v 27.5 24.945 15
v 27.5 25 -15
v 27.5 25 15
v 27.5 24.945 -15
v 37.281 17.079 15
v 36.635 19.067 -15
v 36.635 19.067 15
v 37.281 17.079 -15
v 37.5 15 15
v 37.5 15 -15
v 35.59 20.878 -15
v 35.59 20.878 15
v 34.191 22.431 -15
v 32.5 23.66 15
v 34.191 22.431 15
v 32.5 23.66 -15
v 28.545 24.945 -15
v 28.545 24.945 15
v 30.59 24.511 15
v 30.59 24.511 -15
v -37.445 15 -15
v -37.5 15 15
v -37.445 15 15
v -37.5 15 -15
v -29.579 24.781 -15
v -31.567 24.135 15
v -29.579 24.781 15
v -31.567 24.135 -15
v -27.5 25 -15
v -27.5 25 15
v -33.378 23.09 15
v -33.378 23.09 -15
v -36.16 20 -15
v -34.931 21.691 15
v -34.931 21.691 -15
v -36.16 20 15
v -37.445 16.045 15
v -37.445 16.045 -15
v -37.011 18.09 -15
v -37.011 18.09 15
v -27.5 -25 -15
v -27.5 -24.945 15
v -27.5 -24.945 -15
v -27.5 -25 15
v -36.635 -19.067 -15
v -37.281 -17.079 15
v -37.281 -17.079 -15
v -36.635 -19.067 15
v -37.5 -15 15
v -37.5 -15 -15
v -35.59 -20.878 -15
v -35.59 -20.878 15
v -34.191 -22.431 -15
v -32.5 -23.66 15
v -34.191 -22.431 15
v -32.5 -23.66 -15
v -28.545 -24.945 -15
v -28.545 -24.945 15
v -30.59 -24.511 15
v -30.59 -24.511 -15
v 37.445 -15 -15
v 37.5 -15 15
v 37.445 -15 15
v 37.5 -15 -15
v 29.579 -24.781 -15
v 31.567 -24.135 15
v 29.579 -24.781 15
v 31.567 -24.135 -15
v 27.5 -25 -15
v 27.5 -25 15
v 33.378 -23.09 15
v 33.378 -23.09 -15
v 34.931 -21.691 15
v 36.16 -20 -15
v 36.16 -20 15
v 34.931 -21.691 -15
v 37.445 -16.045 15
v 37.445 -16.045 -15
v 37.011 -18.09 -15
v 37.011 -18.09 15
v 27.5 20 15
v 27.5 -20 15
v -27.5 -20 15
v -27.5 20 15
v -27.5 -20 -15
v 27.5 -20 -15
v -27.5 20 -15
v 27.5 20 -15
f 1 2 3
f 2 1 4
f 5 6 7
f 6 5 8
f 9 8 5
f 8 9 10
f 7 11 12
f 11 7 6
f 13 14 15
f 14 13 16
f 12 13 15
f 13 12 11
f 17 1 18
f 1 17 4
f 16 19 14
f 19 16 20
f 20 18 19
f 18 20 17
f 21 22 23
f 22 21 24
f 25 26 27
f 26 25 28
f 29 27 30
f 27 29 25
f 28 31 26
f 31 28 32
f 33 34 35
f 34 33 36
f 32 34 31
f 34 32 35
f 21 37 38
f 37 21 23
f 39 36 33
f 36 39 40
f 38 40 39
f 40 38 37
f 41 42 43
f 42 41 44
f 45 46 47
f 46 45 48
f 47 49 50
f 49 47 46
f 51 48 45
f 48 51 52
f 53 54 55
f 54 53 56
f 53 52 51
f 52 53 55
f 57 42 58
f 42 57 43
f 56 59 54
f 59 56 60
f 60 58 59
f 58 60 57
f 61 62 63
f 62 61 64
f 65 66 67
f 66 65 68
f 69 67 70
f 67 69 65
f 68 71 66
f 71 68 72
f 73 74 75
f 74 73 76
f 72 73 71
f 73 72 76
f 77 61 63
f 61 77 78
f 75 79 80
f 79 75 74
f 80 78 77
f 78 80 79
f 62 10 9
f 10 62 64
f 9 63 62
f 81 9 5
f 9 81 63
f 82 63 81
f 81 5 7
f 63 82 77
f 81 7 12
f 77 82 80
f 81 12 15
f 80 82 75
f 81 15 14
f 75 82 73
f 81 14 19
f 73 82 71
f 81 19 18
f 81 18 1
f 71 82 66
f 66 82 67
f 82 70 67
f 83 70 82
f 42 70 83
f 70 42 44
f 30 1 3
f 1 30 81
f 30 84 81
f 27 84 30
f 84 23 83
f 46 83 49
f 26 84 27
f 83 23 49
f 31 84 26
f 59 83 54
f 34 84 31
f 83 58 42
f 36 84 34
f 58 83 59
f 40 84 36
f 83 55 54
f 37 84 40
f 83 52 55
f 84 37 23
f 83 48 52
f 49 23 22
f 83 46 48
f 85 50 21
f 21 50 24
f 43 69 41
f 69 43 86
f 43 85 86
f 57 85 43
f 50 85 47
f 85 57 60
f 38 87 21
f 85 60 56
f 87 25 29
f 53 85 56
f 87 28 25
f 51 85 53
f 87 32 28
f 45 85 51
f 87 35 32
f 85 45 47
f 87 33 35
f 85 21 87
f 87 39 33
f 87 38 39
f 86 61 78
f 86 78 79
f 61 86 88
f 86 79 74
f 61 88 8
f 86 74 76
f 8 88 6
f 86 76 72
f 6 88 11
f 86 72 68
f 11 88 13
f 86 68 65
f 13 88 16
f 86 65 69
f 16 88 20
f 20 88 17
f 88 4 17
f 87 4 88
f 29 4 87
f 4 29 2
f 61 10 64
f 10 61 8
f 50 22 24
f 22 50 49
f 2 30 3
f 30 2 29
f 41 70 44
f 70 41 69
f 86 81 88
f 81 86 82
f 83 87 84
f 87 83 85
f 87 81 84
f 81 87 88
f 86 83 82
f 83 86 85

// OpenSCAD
BMO_WIDTH=50;
BMO_HEIGHT=75;
BMO_DEPTH=30;

module edgeprofile(length, radius, rotate)
{
	rotate(rotate, [0, 0, 1])
	render(convexity = 2) difference() {
		cube([radius+10, radius+10, length+10], center = true);
		translate([-10, -10, 0])
			cylinder(h = length+10, r = radius, center = true);
	}
}

module bmo(width, height, depth)
{
	RADIUS=10;
	render(convexity=2) {
		difference() {
			cube([height, width, depth], center=true);
			cube([height-RADIUS*2, width-RADIUS, depth+10], center=true);
			translate([height/2, width/2, 0]) {
				edgeprofile(depth, RADIUS, 0);
			}
			translate([-height/2, width/2, 0]) {
				edgeprofile(depth, RADIUS, 90);
			}
			translate([-height/2, -width/2, 0]) {
				edgeprofile(depth, RADIUS, 180);
			}
			translate([height/2, -width/2, 0]) {
				edgeprofile(depth, RADIUS, 270);
			}
		}
	}
}

bmo(BMO_WIDTH, BMO_HEIGHT, BMO_DEPTH);
